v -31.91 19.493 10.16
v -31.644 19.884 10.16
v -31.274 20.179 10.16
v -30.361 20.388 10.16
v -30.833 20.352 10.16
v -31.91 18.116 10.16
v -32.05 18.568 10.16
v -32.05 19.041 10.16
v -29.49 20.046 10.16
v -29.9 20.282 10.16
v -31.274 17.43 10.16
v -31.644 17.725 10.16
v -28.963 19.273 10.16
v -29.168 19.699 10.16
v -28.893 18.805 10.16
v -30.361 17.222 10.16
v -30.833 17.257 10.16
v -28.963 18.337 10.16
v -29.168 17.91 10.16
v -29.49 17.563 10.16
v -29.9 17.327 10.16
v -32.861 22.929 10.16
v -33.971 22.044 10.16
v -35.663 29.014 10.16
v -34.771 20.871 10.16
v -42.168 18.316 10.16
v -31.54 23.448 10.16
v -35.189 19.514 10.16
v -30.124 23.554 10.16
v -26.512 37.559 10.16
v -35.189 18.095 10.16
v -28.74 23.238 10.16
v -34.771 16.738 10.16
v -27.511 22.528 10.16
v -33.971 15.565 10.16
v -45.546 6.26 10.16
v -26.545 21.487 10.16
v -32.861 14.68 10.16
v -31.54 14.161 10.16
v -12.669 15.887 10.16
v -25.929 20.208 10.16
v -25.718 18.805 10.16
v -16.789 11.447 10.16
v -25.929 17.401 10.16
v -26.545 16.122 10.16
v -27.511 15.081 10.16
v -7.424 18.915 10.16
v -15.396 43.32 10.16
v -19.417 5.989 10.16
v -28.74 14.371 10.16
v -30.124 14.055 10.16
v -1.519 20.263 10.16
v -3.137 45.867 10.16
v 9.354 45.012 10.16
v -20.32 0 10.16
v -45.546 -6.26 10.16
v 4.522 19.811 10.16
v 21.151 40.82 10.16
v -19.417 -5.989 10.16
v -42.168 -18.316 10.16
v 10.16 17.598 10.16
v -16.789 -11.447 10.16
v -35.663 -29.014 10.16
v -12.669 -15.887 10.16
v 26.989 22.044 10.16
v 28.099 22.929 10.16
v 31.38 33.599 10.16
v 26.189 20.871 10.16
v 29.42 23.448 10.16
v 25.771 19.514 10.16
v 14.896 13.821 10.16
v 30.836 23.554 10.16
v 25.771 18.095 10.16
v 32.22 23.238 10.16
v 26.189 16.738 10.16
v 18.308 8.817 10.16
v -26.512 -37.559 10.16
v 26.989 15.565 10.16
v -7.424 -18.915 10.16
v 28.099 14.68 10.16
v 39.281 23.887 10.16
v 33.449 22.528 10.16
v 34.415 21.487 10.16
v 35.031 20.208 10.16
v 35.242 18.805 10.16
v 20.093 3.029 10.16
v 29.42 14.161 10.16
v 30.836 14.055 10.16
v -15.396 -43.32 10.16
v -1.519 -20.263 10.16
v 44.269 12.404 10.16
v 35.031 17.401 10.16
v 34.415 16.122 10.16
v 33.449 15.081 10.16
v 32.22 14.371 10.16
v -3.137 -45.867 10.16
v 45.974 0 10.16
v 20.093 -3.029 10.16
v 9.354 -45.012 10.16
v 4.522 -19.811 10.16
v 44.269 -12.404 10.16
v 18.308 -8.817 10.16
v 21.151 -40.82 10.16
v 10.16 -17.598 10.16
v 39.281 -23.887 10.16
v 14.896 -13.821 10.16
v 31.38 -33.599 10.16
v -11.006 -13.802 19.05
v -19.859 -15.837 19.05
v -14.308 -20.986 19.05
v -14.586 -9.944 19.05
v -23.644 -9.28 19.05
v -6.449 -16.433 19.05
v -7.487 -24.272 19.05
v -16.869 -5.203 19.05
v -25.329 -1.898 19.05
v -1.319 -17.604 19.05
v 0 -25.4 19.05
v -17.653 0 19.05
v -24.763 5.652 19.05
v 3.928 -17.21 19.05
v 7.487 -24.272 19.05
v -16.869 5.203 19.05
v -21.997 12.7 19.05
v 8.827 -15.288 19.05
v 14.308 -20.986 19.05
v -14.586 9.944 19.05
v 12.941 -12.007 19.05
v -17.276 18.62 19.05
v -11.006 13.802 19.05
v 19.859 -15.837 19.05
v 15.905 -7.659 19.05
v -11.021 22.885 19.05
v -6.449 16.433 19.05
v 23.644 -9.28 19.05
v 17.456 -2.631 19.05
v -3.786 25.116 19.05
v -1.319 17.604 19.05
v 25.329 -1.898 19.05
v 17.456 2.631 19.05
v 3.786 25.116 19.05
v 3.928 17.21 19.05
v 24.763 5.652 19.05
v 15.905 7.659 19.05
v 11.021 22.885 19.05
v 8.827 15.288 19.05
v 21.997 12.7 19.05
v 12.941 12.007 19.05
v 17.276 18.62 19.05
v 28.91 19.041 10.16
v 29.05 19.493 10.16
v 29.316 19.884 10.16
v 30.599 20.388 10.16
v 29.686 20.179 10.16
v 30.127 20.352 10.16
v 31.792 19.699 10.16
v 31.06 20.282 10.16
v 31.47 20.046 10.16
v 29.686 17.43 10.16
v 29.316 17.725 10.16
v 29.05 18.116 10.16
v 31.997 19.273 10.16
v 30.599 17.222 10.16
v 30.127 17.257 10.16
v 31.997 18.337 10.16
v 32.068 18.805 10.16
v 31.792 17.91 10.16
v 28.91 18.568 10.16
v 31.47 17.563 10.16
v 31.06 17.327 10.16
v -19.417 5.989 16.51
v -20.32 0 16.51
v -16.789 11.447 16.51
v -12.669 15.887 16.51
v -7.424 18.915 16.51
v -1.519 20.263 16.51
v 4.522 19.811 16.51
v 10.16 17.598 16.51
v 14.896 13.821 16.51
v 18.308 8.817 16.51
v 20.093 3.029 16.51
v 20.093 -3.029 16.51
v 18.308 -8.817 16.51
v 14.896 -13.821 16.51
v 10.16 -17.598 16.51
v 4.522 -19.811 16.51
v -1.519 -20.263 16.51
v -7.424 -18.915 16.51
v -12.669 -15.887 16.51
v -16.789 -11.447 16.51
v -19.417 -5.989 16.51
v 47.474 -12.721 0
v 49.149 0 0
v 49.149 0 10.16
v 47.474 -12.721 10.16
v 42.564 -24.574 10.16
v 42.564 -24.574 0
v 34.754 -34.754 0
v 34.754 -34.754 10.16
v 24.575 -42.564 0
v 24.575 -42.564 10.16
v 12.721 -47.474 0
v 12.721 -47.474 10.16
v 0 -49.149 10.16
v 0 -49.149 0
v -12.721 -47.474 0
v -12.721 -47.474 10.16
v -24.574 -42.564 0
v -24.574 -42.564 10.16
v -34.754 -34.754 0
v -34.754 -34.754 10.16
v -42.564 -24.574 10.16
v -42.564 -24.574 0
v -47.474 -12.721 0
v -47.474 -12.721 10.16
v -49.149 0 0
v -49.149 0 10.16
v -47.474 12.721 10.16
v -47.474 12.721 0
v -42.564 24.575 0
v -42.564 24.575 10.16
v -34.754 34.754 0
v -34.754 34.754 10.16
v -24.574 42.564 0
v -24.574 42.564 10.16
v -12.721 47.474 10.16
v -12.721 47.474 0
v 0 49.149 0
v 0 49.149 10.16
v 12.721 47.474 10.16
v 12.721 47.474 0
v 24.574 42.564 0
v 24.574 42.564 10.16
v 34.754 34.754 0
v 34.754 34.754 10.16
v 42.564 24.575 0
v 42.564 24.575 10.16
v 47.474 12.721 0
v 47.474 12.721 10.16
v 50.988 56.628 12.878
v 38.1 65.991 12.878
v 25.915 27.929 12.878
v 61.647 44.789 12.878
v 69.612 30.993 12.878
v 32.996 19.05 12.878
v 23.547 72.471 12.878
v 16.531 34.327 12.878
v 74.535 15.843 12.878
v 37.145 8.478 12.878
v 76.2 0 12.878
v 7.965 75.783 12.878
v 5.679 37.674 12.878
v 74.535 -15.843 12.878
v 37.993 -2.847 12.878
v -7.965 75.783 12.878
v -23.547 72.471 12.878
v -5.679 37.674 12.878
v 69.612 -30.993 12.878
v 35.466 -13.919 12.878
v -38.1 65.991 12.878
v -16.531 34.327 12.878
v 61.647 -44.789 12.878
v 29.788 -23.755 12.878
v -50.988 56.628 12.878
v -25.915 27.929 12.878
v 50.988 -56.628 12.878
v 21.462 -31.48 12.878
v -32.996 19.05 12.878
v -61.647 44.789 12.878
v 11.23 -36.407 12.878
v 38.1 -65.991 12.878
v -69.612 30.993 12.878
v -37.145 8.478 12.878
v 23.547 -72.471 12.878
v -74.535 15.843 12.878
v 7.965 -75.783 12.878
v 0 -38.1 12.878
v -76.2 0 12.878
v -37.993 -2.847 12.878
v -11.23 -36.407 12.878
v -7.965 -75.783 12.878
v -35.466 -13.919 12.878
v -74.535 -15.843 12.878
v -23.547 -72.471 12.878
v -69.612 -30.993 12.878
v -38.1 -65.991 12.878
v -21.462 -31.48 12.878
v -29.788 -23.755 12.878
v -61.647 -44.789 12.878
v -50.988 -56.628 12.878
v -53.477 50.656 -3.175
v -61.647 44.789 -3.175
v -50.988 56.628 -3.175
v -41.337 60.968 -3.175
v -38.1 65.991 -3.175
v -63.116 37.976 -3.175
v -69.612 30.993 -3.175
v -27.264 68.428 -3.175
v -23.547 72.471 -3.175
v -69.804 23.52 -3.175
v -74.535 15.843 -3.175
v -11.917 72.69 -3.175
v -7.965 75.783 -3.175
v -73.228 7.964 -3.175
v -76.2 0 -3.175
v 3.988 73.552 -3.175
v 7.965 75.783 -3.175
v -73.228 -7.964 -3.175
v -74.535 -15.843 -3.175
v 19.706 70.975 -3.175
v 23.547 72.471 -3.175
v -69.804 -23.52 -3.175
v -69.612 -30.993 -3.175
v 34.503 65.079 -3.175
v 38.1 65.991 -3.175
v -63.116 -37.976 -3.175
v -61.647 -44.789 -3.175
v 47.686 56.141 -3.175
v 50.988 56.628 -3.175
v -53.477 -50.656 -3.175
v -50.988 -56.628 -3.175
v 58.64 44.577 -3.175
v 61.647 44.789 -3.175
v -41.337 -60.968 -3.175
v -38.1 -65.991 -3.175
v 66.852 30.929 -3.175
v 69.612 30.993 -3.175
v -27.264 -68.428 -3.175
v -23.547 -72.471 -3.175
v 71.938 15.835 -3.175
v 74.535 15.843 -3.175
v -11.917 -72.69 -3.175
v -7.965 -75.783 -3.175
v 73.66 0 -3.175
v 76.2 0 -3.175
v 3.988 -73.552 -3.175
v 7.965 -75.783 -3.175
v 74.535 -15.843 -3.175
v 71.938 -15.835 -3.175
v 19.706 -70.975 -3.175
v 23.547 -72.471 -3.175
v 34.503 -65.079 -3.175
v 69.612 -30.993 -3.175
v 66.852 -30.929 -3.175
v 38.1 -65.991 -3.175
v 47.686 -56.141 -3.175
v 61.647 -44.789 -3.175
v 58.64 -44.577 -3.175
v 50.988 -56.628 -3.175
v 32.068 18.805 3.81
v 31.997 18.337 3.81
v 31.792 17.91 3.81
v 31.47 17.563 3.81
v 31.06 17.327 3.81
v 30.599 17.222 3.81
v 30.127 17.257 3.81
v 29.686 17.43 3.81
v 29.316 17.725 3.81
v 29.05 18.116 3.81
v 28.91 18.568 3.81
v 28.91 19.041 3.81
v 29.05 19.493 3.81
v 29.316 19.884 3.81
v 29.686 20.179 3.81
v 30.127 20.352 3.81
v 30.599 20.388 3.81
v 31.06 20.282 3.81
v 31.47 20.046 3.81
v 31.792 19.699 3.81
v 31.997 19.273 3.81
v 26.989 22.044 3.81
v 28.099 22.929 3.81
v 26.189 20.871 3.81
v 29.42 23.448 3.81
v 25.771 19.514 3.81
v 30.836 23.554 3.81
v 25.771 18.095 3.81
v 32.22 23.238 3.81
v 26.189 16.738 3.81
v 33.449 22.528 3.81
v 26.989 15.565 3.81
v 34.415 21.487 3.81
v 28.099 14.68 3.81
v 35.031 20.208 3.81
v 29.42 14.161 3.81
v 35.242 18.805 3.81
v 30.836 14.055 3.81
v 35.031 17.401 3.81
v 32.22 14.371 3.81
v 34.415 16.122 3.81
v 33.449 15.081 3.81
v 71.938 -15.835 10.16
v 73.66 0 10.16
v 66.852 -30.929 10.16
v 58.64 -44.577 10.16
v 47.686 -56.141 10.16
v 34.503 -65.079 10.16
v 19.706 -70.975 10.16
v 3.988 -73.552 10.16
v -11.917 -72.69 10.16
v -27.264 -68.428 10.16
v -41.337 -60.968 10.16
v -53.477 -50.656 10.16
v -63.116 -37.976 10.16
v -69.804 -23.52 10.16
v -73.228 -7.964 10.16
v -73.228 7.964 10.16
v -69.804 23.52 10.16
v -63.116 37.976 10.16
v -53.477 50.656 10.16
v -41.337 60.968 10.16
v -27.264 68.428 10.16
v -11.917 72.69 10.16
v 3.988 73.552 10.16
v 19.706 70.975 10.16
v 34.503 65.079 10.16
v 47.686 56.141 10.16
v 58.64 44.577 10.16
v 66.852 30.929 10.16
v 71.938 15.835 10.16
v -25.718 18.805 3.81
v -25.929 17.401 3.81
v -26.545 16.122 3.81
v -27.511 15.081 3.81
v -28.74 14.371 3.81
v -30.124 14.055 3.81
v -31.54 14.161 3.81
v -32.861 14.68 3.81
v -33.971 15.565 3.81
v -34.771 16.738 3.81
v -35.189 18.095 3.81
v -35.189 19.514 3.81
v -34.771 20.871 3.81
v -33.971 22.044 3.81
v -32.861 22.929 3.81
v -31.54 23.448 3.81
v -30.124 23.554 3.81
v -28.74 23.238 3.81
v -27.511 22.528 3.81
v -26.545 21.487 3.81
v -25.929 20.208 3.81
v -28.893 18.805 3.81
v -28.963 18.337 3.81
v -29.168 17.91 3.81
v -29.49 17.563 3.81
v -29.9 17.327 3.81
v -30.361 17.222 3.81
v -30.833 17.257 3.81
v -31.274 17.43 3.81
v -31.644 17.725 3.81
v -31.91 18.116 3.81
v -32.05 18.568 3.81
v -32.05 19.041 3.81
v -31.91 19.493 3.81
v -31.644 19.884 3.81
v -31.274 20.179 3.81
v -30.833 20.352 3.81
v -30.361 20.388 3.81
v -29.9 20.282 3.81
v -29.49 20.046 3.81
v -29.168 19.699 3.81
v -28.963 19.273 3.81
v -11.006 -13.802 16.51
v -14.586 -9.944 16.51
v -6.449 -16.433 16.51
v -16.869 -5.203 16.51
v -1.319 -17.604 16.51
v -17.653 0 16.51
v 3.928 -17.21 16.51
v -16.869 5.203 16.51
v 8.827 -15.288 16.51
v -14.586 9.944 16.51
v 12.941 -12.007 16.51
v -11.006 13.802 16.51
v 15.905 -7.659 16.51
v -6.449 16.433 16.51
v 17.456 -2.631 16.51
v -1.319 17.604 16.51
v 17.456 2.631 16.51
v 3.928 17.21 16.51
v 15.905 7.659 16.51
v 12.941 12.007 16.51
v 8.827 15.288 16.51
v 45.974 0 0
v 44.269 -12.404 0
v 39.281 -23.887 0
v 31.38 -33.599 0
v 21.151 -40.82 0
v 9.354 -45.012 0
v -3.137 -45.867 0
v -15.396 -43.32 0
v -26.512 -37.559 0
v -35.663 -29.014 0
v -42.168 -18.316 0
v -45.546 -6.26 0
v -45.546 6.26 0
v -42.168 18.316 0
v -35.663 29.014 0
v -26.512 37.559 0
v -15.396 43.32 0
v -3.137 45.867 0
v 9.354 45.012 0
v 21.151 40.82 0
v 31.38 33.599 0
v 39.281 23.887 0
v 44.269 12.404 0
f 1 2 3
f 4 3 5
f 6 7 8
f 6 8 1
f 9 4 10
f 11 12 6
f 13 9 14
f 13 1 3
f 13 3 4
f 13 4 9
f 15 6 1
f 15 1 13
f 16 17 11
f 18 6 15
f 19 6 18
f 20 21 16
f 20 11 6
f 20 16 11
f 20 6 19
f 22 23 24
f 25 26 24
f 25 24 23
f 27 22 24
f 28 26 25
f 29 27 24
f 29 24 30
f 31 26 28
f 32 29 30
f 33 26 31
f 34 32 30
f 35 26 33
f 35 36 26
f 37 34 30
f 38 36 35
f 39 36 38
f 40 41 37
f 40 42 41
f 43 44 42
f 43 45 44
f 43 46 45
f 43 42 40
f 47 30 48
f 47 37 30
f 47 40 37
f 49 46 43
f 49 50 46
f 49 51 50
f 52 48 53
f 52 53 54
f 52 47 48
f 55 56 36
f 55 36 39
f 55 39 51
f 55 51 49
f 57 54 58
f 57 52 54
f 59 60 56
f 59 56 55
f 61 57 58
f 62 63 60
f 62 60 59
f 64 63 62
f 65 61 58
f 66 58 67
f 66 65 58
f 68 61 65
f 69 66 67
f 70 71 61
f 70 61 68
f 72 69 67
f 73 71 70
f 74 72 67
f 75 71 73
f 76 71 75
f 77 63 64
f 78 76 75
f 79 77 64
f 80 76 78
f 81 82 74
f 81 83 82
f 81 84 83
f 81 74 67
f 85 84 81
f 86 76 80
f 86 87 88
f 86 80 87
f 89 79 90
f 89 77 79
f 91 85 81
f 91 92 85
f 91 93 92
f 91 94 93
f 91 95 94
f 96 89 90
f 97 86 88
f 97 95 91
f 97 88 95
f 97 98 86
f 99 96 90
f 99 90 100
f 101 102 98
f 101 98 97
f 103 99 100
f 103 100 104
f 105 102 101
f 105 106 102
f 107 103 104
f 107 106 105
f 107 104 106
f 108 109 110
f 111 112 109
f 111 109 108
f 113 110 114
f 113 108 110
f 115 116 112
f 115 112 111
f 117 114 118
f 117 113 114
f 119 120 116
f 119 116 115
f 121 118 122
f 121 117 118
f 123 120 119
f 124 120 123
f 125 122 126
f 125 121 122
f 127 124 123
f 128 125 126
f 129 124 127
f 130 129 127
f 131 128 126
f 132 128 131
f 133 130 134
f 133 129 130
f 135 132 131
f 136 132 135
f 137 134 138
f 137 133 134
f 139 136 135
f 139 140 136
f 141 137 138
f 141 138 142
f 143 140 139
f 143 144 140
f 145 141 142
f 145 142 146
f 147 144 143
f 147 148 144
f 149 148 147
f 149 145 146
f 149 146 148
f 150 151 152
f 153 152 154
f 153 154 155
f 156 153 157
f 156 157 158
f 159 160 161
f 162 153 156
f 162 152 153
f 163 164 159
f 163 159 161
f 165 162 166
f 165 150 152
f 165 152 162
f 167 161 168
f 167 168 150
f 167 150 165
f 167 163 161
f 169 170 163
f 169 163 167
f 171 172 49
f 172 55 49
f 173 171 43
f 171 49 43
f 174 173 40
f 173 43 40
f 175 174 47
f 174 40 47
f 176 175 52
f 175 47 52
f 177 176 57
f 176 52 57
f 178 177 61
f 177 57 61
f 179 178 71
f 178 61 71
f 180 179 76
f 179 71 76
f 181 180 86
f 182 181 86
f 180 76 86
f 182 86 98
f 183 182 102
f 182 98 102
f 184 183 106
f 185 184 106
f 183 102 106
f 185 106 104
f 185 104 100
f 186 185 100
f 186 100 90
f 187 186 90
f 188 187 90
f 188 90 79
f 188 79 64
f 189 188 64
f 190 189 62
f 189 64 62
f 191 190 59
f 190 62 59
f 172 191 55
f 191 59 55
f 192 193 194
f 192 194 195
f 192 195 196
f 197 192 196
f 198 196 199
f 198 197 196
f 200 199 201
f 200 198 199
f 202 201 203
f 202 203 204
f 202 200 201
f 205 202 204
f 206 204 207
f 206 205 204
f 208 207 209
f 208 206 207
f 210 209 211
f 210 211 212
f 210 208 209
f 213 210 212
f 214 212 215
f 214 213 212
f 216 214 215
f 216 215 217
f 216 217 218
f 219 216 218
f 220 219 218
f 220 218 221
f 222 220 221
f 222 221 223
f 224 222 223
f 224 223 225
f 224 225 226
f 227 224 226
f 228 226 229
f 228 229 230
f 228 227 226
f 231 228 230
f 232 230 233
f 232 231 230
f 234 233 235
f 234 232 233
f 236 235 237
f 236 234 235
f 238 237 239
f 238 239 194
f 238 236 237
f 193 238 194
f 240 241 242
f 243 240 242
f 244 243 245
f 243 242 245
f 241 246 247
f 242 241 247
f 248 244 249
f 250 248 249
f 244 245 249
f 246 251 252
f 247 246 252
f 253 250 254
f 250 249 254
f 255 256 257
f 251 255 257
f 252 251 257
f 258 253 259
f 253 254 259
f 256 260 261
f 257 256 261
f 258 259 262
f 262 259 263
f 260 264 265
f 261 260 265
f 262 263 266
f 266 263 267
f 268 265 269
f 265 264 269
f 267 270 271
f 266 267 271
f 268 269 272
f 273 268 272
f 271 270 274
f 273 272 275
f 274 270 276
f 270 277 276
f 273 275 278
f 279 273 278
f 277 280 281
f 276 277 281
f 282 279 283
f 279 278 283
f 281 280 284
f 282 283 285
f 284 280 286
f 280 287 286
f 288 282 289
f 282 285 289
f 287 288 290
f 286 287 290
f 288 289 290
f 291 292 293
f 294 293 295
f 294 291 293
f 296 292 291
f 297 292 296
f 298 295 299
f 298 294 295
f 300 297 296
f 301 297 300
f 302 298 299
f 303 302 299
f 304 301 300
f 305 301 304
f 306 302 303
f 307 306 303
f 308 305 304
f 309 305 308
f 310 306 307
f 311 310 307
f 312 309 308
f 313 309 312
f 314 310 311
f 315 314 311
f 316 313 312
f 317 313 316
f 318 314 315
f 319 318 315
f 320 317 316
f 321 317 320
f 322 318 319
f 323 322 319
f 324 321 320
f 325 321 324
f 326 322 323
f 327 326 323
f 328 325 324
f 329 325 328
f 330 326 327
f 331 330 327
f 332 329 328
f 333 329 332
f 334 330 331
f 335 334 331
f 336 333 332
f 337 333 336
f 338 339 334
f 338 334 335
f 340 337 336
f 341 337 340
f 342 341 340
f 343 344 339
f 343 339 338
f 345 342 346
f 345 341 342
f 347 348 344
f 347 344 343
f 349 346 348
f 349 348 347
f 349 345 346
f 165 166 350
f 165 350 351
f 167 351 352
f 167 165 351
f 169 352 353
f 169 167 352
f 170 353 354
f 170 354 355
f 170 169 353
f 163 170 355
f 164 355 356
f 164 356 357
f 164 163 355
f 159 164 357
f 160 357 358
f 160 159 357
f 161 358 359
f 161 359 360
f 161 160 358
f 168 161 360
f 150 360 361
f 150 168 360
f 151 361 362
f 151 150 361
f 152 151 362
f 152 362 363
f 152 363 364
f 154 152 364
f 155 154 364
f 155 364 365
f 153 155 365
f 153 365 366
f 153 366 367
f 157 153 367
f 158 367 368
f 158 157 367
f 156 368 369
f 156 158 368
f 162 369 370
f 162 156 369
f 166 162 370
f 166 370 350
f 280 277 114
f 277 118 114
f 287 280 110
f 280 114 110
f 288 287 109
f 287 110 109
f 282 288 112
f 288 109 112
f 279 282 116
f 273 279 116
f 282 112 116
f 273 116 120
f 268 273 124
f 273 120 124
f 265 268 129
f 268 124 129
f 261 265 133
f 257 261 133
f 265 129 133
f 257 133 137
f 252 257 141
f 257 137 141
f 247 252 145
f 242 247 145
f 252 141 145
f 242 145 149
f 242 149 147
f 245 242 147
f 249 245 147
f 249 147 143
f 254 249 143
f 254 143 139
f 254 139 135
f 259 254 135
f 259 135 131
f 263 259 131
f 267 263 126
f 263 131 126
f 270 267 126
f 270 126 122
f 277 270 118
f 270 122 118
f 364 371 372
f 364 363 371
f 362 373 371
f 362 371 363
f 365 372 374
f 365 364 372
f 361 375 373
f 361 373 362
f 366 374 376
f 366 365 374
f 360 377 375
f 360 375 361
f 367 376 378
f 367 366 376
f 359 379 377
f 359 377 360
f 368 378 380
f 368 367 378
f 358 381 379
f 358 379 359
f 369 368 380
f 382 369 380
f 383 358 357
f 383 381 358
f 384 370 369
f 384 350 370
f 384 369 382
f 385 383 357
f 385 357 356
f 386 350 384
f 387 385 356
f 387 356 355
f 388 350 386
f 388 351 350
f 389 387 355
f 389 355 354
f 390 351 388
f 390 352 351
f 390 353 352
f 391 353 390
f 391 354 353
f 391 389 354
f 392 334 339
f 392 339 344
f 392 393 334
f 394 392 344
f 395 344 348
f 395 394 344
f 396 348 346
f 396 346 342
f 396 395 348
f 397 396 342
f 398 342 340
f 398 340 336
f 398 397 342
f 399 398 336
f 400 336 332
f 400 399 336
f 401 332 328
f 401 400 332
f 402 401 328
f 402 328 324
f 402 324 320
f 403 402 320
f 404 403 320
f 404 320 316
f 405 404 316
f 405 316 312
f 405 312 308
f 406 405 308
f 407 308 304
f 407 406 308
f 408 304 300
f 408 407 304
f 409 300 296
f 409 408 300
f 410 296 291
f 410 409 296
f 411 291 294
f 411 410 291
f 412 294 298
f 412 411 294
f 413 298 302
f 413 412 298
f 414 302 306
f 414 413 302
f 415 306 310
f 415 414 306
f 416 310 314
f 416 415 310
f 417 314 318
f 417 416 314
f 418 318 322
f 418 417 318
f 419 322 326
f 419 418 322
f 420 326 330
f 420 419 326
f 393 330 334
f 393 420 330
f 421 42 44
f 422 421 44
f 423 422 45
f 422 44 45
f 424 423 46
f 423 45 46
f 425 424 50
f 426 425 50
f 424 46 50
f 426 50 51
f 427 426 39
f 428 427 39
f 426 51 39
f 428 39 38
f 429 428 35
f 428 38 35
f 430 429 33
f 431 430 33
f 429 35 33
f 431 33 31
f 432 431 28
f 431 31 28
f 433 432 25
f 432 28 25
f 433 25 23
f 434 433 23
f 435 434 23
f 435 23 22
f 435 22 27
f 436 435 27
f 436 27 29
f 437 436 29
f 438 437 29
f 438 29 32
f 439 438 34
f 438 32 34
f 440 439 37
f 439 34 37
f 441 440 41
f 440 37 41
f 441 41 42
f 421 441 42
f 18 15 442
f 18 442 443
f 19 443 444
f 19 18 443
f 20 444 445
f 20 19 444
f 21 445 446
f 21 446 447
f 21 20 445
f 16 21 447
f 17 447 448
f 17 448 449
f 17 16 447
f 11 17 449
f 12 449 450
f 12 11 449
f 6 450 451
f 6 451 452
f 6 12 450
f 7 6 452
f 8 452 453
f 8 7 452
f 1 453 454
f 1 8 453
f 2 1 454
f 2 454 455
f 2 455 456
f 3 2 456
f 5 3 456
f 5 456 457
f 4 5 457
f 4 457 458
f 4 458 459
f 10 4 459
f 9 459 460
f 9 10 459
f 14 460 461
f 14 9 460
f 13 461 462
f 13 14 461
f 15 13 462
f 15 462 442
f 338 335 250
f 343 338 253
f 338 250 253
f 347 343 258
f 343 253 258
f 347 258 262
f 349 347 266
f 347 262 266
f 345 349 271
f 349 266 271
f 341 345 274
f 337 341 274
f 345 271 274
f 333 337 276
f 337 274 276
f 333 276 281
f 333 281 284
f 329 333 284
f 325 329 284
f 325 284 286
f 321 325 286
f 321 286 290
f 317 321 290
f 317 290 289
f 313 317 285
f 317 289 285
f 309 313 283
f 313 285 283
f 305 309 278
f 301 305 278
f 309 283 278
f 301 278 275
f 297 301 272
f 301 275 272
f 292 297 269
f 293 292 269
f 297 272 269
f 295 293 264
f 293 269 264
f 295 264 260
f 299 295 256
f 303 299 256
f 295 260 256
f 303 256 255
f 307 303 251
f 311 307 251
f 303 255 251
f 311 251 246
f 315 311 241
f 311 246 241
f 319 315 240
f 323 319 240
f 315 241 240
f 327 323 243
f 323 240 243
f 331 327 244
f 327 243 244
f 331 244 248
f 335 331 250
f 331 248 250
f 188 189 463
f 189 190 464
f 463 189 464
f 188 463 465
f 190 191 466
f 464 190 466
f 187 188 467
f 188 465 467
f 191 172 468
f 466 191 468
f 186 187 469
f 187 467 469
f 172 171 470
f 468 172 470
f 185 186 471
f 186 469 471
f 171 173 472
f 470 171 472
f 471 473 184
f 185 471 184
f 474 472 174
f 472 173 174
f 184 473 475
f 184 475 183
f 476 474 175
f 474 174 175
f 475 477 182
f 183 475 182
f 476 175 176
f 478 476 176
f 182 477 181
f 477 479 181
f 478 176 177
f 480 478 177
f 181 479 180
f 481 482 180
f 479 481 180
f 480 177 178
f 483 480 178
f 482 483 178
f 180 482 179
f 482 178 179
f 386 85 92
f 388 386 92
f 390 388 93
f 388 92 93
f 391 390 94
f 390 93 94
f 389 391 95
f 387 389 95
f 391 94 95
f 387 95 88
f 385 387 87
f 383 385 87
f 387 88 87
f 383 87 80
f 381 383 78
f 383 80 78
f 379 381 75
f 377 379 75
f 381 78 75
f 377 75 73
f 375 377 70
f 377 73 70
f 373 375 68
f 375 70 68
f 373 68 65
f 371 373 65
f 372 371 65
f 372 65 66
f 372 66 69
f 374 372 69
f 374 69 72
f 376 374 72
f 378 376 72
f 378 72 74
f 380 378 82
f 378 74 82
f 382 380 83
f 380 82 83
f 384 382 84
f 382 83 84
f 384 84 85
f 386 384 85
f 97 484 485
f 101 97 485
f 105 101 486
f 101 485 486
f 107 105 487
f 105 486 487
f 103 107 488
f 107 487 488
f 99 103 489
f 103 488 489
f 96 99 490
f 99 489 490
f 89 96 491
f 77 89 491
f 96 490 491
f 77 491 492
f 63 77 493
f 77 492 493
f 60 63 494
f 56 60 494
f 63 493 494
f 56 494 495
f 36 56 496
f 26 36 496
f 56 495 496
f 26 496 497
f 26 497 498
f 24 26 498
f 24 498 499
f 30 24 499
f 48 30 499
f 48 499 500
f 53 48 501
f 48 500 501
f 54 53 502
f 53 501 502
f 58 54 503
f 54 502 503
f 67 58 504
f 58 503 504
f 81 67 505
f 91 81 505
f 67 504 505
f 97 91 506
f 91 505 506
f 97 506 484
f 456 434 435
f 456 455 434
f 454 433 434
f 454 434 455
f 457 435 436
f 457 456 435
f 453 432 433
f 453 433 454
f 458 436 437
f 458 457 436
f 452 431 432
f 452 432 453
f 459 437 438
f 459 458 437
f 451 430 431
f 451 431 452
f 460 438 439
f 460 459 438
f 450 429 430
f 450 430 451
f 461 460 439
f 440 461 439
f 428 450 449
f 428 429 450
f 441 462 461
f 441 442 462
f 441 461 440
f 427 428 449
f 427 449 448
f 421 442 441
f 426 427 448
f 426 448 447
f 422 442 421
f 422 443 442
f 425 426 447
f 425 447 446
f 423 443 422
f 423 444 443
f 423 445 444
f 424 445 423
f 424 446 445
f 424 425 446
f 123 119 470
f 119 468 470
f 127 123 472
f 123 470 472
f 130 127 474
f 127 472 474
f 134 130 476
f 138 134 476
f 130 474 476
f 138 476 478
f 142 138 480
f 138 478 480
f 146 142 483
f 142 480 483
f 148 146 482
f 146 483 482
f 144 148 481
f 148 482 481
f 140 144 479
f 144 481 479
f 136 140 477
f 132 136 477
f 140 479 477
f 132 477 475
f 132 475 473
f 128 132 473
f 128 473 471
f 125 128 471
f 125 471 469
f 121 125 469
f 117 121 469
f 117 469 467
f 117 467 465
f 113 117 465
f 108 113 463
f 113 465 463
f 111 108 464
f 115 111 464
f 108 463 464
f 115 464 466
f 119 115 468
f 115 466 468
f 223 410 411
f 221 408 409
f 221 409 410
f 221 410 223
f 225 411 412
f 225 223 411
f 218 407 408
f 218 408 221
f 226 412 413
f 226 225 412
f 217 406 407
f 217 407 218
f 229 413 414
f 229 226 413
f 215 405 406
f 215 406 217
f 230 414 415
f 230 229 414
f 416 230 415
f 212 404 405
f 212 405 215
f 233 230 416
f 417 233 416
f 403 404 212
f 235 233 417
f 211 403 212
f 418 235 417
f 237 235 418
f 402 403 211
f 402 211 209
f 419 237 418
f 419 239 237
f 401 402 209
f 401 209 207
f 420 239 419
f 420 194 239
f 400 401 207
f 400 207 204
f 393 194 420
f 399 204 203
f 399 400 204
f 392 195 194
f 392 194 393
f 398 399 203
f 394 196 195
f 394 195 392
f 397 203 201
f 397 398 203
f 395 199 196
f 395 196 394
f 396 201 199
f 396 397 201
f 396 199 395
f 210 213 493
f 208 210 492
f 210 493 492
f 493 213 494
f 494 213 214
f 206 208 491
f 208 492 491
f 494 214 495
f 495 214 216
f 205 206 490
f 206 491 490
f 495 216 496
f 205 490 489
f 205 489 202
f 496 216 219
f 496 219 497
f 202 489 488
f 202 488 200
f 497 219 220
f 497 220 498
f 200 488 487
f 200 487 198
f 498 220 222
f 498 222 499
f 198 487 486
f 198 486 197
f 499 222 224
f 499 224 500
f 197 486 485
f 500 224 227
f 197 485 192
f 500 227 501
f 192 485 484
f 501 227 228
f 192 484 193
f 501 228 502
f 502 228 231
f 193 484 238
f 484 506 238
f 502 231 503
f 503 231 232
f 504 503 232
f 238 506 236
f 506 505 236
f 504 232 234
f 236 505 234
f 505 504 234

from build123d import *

# Parameters (mm, degrees)
F0_R      = 76.2
F1_DEPTH  = 19.05
F2_R      = 45.974
F3_DEPTH  = 10.16
F8_R      = 73.66
F8_R_2    = 49.149
F9_DEPTH  = 10.16
F10_R     = 76.2
F10_R_2   = 73.66
F11_DEPTH = 3.175
F14_R     = 4.7625
F14_R_2   = 1.5875
F15_DEPTH = 6.35


with BuildPart() as f1:
    # F0 (on Top) → F1 (new body)
    with BuildSketch(Plane.XY):
        Circle(F0_R)
    extrude(amount=F1_DEPTH)

    # F2 (on face) → F3 (cut)
    with BuildSketch(Plane(origin=(0, 0, 0), x_dir=(1, 0, 0), z_dir=(0, 0, -1))):
        Circle(F2_R)
    extrude(amount=-F3_DEPTH, mode=Mode.SUBTRACT)

    # F4 (on Front) → F5 (revolve, cut)
    with BuildSketch(Plane.XZ):
        Polygon((-17.653, 19.05), (-17.653, 16.51), (-20.32, 16.51), (-20.32, 10.16), (0, 10.16), (0, 19.05), align=None)
    revolve(axis=Axis((0, 0, 14.605), (0, 0, -1)), mode=Mode.SUBTRACT)

    # F6 (on Right) → F7 (revolve, cut)
    with BuildSketch(Plane.YZ):
        Polygon((-38.1, 12.8778), (-25.4, 19.05), (0, 19.05), (0, 29.321771), (-86.354569, 29.321771), (-86.354569, 12.8778), align=None)
    revolve(axis=Axis((0, 0, 24.185886), (0, 0, -1)), mode=Mode.SUBTRACT)

    # F8 (on face) → F9 (cut, through all)
    with BuildSketch(Plane(origin=(0, 0, 0), x_dir=(1, 0, 0), z_dir=(0, 0, -1))):
        Circle(F8_R)
        Circle(F8_R_2, mode=Mode.SUBTRACT)
    extrude(amount=-F9_DEPTH, mode=Mode.SUBTRACT)

    # F10 (on face) → F11 (join)
    with BuildSketch(Plane(origin=(0, 0, 0), x_dir=(1, 0, 0), z_dir=(0, 0, -1))):
        Circle(F10_R)
        Circle(F10_R_2, mode=Mode.SUBTRACT)
    extrude(amount=F11_DEPTH)

    # F14 (on face) → F15 (join)
    with BuildSketch(Plane(origin=(0, 0, 10.16), x_dir=(1, 0, 0), z_dir=(0, 0, -1))):
        with Locations((30.48, -18.804579)):
            Circle(F14_R)
        with Locations((30.48, -18.804579)):
            Circle(F14_R_2, mode=Mode.SUBTRACT)
        with Locations((-30.48, -18.804579)):
            Circle(F14_R)
        with Locations((-30.48, -18.804579)):
            Circle(F14_R_2, mode=Mode.SUBTRACT)
    extrude(amount=F15_DEPTH)


solid = f1.part
